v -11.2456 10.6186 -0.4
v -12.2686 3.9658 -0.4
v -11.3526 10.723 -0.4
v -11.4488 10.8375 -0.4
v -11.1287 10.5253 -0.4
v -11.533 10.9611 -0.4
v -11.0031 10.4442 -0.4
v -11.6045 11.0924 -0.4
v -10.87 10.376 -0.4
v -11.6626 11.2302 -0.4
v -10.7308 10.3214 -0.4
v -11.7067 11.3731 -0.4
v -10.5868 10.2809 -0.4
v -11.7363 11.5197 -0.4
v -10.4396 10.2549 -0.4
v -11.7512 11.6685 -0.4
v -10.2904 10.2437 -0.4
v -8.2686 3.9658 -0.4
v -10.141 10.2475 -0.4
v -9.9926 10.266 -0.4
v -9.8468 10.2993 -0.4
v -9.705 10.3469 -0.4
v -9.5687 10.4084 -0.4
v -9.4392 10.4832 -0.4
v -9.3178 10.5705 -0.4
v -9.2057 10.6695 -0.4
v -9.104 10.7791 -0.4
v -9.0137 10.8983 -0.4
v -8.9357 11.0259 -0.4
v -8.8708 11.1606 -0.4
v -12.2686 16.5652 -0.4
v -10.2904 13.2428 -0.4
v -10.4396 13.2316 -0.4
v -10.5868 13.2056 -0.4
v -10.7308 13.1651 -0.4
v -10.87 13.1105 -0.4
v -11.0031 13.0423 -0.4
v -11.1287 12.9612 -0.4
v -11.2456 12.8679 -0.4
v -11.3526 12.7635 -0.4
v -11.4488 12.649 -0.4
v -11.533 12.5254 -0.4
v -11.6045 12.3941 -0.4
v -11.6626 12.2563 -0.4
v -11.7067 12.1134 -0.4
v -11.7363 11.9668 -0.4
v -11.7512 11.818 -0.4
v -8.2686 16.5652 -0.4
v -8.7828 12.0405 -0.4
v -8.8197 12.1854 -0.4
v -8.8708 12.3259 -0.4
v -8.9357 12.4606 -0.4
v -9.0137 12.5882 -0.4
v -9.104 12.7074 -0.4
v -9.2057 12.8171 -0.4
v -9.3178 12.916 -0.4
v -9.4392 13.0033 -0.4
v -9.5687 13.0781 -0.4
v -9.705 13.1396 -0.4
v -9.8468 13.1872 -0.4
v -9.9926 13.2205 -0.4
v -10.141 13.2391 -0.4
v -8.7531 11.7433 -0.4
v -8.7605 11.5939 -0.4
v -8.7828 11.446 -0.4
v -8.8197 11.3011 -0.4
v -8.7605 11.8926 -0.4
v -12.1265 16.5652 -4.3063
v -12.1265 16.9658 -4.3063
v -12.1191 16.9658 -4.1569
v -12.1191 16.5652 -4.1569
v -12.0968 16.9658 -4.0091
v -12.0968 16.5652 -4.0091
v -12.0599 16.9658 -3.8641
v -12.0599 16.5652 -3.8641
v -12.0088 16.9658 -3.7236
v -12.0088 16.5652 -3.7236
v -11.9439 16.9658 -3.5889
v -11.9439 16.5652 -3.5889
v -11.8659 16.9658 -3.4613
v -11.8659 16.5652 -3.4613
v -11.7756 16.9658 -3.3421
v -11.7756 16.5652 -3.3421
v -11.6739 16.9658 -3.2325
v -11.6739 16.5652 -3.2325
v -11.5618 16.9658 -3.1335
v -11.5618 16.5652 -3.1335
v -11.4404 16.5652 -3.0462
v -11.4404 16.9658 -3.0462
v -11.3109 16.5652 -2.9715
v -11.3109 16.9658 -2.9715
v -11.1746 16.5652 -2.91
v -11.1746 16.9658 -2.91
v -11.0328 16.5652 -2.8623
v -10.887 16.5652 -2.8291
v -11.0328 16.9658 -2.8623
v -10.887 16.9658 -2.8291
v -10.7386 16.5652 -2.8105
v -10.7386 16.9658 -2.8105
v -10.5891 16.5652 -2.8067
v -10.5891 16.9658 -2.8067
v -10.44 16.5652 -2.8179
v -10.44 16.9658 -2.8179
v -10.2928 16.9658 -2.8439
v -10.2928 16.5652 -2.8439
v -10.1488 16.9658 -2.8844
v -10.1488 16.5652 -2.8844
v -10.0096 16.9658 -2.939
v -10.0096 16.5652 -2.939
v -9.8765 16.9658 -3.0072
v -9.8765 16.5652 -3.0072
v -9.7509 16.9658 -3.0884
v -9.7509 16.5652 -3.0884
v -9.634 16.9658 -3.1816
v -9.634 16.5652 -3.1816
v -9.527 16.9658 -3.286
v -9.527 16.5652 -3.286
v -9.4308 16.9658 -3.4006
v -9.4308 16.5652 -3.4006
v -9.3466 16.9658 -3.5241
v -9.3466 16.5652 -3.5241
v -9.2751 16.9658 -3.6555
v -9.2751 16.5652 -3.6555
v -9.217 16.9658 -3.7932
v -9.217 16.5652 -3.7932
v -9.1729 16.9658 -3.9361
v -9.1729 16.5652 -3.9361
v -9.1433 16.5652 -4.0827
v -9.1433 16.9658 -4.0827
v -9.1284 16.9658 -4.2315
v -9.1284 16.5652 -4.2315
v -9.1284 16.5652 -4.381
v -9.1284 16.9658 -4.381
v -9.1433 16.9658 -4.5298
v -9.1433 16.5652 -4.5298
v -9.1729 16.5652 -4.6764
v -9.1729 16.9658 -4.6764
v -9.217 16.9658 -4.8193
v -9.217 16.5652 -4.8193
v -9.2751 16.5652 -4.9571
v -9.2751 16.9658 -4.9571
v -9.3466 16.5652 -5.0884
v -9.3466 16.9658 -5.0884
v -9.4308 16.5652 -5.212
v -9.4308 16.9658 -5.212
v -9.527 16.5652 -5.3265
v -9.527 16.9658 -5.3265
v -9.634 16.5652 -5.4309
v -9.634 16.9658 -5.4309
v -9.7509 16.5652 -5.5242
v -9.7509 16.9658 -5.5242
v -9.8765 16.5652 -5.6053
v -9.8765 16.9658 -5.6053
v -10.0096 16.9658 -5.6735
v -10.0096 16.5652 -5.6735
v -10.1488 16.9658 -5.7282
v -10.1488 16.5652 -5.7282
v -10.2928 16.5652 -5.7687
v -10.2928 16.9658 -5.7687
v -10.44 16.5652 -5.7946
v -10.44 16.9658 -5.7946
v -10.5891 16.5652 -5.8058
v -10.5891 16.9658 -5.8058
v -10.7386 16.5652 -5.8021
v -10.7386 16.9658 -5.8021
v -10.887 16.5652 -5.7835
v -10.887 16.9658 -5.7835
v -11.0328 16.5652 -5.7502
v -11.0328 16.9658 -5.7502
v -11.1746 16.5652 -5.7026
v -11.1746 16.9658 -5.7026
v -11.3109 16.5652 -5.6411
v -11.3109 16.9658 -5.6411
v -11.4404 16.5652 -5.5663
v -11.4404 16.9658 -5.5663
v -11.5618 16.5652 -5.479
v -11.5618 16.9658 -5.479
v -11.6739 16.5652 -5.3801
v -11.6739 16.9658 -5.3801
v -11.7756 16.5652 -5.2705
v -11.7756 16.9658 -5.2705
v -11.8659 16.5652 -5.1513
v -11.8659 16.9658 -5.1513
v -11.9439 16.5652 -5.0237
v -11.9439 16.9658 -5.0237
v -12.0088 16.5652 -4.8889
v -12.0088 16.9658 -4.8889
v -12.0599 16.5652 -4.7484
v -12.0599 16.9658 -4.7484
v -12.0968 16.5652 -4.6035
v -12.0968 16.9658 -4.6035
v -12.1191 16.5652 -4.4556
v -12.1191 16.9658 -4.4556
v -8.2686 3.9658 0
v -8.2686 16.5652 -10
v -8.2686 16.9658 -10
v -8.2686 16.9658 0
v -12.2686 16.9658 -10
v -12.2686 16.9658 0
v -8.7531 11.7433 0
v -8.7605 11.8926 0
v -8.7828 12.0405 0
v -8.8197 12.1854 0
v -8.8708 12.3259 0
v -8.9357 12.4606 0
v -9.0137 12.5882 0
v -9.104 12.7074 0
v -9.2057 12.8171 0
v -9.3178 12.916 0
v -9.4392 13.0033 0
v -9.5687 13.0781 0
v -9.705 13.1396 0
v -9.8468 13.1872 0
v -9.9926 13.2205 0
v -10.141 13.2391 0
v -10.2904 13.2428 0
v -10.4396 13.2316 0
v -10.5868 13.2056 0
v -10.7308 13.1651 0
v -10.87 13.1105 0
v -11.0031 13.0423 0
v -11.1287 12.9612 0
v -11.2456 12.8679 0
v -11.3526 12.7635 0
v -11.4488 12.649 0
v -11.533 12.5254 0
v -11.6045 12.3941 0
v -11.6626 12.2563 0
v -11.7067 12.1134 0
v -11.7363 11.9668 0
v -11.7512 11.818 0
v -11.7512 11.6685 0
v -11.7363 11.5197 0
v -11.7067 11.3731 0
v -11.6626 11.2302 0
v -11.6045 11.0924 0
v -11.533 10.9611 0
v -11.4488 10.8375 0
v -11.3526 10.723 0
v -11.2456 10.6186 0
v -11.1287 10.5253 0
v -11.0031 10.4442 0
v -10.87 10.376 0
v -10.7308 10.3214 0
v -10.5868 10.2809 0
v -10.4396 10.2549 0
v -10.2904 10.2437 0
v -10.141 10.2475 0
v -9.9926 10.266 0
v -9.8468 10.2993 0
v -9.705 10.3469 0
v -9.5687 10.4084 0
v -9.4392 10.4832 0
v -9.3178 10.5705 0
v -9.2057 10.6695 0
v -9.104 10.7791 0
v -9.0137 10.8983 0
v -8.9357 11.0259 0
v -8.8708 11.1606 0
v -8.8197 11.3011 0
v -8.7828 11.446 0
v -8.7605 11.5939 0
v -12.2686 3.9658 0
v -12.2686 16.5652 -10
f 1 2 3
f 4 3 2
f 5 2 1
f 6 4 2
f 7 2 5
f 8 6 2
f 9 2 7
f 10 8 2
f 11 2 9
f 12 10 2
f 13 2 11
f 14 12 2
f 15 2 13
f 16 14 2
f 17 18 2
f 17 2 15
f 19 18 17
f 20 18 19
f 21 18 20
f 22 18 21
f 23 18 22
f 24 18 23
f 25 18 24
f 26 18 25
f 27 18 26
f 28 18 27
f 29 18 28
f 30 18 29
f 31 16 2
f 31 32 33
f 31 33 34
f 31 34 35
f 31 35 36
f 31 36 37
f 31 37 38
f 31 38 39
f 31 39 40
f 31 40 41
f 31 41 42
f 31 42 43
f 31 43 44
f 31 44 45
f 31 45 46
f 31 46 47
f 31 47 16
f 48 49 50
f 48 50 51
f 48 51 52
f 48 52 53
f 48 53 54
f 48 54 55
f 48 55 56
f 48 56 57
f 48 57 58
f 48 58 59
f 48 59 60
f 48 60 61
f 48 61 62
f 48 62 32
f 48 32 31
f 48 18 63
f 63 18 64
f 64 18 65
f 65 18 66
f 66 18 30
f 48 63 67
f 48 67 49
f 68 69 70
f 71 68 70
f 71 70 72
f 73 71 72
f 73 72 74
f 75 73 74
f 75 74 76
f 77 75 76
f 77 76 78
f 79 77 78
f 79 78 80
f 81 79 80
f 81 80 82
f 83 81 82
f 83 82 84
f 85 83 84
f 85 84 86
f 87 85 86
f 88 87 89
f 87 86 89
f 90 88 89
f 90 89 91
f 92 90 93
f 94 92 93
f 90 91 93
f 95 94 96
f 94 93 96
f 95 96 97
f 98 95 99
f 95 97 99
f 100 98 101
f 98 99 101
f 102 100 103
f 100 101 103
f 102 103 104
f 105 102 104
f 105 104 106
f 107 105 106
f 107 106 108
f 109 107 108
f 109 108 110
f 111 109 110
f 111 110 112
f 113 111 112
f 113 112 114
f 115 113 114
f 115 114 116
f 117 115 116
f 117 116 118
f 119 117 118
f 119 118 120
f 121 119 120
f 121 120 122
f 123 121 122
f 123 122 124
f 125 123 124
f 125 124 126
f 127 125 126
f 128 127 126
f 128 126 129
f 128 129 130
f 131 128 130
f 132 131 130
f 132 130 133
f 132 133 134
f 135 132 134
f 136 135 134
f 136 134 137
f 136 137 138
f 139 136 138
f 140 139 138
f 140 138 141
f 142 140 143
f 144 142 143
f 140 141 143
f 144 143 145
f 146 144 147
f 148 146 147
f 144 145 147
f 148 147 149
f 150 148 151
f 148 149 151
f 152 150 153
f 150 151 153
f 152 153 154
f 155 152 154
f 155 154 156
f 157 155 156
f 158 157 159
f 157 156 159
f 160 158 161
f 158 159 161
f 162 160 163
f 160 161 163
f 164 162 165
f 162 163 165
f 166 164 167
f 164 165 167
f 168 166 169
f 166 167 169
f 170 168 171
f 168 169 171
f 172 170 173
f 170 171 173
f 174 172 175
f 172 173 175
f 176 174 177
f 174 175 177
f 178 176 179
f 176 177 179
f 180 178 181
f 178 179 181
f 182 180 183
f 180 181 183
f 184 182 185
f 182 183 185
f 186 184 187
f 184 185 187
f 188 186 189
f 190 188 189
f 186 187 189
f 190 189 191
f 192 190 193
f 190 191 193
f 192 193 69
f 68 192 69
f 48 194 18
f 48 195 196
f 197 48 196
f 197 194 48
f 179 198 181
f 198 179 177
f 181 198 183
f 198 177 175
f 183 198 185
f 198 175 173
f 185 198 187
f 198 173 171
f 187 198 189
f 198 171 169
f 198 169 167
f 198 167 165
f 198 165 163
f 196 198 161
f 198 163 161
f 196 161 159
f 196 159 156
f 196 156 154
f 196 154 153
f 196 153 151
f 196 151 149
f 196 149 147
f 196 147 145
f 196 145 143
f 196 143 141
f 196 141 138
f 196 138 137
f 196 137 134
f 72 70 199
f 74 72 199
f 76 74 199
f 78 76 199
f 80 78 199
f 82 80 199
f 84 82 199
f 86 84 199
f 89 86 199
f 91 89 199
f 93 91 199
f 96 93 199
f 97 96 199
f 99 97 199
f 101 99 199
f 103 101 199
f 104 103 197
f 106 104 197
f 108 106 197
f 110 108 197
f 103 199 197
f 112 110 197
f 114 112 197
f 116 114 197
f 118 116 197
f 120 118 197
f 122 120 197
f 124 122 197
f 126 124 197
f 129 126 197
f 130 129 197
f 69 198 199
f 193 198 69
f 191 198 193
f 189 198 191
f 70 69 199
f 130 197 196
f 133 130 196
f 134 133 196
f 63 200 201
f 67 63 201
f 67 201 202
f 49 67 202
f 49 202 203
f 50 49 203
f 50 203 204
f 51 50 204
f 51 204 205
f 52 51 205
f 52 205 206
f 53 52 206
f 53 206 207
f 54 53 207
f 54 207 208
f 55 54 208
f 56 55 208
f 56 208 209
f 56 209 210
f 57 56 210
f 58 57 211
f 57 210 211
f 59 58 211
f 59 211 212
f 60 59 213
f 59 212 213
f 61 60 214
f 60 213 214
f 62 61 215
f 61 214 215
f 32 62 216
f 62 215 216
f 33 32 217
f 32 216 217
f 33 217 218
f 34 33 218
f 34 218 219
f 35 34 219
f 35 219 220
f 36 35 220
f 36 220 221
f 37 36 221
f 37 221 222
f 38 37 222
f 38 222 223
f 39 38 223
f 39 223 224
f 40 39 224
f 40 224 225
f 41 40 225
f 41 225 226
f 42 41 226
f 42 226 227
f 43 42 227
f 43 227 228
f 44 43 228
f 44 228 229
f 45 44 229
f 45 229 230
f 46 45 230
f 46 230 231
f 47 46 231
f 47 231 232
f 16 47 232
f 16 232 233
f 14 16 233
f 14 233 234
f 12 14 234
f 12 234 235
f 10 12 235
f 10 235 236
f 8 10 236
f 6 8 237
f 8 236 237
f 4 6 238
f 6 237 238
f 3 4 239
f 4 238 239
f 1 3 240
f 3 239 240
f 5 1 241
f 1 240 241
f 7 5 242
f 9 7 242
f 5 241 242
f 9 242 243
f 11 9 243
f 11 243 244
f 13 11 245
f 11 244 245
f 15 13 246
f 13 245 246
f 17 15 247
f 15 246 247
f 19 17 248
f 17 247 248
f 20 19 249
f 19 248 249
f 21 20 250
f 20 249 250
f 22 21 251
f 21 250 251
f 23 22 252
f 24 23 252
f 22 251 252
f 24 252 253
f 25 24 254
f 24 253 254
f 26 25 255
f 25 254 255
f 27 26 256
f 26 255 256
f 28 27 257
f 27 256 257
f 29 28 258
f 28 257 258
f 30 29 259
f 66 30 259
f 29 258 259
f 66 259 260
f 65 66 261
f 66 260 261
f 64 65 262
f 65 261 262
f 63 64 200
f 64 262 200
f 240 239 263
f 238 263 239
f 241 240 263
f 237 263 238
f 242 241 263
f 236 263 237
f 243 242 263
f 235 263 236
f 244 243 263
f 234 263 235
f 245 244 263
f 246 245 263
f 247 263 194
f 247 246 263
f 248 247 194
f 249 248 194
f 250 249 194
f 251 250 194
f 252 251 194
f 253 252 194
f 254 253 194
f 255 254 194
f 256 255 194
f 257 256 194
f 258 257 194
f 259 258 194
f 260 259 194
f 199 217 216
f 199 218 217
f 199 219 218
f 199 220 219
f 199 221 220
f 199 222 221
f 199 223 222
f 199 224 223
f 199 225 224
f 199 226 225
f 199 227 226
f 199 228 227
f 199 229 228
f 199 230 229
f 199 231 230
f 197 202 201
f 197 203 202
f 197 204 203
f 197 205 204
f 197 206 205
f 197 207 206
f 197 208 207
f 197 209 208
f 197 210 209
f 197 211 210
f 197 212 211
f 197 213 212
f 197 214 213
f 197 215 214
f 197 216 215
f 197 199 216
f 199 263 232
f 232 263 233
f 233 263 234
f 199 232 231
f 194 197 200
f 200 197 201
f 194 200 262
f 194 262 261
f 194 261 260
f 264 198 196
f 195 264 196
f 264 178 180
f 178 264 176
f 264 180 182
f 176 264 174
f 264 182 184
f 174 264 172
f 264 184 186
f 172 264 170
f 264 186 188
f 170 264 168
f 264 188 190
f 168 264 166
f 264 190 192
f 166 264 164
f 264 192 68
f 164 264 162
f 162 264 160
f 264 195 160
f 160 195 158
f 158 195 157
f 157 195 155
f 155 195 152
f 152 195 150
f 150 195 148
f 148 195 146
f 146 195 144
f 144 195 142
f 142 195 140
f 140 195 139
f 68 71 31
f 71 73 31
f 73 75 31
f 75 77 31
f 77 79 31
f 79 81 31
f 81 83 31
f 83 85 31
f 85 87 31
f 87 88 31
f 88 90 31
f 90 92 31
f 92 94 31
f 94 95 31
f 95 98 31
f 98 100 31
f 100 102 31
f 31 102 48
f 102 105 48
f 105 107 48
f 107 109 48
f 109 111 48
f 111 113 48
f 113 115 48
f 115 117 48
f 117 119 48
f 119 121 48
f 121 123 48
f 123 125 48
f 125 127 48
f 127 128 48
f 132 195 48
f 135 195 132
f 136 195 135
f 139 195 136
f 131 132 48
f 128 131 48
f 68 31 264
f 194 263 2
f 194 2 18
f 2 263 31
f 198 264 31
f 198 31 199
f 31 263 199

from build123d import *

# Parameters (mm, degrees)
SKETCH002_W     = 4
SKETCH002_H     = 13
SKETCH002_R     = 1.5
PAD002_DEPTH    = 10
SKETCH003_W     = 12.732194
SKETCH003_H     = 9.787396
POCKET_DEPTH    = 5
SKETCH004_R     = 1.5
POCKET001_DEPTH = 5


with BuildPart() as part:
    # Sketch002 → Pad002 (new body)
    with BuildSketch(Plane.XY):
        with Locations((-10.268592, 10.465797)):
            Rectangle(SKETCH002_W, SKETCH002_H)
        with Locations((-10.253053, 11.743256)):
            Circle(SKETCH002_R, mode=Mode.SUBTRACT)
    extrude(amount=-PAD002_DEPTH)

    # Sketch003 (on Face2 of Pad002) → Pocket (cut)
    with BuildSketch(Plane.YZ.offset(-8.268592)):
        with Locations((10.199147, -5.293698)):
            Rectangle(SKETCH003_W, SKETCH003_H)
    extrude(amount=-POCKET_DEPTH, mode=Mode.SUBTRACT)

    # Sketch004 (on Face6 of Pocket) → Pocket001 (cut)
    with BuildSketch(Plane(origin=(0, 16.965797, 0), x_dir=(-1, 0, 0), z_dir=(0, 1, 0))):
        with Locations((10.62654, -4.306276)):
            Circle(SKETCH004_R)
    extrude(amount=-POCKET001_DEPTH, mode=Mode.SUBTRACT)


solid = part.part
